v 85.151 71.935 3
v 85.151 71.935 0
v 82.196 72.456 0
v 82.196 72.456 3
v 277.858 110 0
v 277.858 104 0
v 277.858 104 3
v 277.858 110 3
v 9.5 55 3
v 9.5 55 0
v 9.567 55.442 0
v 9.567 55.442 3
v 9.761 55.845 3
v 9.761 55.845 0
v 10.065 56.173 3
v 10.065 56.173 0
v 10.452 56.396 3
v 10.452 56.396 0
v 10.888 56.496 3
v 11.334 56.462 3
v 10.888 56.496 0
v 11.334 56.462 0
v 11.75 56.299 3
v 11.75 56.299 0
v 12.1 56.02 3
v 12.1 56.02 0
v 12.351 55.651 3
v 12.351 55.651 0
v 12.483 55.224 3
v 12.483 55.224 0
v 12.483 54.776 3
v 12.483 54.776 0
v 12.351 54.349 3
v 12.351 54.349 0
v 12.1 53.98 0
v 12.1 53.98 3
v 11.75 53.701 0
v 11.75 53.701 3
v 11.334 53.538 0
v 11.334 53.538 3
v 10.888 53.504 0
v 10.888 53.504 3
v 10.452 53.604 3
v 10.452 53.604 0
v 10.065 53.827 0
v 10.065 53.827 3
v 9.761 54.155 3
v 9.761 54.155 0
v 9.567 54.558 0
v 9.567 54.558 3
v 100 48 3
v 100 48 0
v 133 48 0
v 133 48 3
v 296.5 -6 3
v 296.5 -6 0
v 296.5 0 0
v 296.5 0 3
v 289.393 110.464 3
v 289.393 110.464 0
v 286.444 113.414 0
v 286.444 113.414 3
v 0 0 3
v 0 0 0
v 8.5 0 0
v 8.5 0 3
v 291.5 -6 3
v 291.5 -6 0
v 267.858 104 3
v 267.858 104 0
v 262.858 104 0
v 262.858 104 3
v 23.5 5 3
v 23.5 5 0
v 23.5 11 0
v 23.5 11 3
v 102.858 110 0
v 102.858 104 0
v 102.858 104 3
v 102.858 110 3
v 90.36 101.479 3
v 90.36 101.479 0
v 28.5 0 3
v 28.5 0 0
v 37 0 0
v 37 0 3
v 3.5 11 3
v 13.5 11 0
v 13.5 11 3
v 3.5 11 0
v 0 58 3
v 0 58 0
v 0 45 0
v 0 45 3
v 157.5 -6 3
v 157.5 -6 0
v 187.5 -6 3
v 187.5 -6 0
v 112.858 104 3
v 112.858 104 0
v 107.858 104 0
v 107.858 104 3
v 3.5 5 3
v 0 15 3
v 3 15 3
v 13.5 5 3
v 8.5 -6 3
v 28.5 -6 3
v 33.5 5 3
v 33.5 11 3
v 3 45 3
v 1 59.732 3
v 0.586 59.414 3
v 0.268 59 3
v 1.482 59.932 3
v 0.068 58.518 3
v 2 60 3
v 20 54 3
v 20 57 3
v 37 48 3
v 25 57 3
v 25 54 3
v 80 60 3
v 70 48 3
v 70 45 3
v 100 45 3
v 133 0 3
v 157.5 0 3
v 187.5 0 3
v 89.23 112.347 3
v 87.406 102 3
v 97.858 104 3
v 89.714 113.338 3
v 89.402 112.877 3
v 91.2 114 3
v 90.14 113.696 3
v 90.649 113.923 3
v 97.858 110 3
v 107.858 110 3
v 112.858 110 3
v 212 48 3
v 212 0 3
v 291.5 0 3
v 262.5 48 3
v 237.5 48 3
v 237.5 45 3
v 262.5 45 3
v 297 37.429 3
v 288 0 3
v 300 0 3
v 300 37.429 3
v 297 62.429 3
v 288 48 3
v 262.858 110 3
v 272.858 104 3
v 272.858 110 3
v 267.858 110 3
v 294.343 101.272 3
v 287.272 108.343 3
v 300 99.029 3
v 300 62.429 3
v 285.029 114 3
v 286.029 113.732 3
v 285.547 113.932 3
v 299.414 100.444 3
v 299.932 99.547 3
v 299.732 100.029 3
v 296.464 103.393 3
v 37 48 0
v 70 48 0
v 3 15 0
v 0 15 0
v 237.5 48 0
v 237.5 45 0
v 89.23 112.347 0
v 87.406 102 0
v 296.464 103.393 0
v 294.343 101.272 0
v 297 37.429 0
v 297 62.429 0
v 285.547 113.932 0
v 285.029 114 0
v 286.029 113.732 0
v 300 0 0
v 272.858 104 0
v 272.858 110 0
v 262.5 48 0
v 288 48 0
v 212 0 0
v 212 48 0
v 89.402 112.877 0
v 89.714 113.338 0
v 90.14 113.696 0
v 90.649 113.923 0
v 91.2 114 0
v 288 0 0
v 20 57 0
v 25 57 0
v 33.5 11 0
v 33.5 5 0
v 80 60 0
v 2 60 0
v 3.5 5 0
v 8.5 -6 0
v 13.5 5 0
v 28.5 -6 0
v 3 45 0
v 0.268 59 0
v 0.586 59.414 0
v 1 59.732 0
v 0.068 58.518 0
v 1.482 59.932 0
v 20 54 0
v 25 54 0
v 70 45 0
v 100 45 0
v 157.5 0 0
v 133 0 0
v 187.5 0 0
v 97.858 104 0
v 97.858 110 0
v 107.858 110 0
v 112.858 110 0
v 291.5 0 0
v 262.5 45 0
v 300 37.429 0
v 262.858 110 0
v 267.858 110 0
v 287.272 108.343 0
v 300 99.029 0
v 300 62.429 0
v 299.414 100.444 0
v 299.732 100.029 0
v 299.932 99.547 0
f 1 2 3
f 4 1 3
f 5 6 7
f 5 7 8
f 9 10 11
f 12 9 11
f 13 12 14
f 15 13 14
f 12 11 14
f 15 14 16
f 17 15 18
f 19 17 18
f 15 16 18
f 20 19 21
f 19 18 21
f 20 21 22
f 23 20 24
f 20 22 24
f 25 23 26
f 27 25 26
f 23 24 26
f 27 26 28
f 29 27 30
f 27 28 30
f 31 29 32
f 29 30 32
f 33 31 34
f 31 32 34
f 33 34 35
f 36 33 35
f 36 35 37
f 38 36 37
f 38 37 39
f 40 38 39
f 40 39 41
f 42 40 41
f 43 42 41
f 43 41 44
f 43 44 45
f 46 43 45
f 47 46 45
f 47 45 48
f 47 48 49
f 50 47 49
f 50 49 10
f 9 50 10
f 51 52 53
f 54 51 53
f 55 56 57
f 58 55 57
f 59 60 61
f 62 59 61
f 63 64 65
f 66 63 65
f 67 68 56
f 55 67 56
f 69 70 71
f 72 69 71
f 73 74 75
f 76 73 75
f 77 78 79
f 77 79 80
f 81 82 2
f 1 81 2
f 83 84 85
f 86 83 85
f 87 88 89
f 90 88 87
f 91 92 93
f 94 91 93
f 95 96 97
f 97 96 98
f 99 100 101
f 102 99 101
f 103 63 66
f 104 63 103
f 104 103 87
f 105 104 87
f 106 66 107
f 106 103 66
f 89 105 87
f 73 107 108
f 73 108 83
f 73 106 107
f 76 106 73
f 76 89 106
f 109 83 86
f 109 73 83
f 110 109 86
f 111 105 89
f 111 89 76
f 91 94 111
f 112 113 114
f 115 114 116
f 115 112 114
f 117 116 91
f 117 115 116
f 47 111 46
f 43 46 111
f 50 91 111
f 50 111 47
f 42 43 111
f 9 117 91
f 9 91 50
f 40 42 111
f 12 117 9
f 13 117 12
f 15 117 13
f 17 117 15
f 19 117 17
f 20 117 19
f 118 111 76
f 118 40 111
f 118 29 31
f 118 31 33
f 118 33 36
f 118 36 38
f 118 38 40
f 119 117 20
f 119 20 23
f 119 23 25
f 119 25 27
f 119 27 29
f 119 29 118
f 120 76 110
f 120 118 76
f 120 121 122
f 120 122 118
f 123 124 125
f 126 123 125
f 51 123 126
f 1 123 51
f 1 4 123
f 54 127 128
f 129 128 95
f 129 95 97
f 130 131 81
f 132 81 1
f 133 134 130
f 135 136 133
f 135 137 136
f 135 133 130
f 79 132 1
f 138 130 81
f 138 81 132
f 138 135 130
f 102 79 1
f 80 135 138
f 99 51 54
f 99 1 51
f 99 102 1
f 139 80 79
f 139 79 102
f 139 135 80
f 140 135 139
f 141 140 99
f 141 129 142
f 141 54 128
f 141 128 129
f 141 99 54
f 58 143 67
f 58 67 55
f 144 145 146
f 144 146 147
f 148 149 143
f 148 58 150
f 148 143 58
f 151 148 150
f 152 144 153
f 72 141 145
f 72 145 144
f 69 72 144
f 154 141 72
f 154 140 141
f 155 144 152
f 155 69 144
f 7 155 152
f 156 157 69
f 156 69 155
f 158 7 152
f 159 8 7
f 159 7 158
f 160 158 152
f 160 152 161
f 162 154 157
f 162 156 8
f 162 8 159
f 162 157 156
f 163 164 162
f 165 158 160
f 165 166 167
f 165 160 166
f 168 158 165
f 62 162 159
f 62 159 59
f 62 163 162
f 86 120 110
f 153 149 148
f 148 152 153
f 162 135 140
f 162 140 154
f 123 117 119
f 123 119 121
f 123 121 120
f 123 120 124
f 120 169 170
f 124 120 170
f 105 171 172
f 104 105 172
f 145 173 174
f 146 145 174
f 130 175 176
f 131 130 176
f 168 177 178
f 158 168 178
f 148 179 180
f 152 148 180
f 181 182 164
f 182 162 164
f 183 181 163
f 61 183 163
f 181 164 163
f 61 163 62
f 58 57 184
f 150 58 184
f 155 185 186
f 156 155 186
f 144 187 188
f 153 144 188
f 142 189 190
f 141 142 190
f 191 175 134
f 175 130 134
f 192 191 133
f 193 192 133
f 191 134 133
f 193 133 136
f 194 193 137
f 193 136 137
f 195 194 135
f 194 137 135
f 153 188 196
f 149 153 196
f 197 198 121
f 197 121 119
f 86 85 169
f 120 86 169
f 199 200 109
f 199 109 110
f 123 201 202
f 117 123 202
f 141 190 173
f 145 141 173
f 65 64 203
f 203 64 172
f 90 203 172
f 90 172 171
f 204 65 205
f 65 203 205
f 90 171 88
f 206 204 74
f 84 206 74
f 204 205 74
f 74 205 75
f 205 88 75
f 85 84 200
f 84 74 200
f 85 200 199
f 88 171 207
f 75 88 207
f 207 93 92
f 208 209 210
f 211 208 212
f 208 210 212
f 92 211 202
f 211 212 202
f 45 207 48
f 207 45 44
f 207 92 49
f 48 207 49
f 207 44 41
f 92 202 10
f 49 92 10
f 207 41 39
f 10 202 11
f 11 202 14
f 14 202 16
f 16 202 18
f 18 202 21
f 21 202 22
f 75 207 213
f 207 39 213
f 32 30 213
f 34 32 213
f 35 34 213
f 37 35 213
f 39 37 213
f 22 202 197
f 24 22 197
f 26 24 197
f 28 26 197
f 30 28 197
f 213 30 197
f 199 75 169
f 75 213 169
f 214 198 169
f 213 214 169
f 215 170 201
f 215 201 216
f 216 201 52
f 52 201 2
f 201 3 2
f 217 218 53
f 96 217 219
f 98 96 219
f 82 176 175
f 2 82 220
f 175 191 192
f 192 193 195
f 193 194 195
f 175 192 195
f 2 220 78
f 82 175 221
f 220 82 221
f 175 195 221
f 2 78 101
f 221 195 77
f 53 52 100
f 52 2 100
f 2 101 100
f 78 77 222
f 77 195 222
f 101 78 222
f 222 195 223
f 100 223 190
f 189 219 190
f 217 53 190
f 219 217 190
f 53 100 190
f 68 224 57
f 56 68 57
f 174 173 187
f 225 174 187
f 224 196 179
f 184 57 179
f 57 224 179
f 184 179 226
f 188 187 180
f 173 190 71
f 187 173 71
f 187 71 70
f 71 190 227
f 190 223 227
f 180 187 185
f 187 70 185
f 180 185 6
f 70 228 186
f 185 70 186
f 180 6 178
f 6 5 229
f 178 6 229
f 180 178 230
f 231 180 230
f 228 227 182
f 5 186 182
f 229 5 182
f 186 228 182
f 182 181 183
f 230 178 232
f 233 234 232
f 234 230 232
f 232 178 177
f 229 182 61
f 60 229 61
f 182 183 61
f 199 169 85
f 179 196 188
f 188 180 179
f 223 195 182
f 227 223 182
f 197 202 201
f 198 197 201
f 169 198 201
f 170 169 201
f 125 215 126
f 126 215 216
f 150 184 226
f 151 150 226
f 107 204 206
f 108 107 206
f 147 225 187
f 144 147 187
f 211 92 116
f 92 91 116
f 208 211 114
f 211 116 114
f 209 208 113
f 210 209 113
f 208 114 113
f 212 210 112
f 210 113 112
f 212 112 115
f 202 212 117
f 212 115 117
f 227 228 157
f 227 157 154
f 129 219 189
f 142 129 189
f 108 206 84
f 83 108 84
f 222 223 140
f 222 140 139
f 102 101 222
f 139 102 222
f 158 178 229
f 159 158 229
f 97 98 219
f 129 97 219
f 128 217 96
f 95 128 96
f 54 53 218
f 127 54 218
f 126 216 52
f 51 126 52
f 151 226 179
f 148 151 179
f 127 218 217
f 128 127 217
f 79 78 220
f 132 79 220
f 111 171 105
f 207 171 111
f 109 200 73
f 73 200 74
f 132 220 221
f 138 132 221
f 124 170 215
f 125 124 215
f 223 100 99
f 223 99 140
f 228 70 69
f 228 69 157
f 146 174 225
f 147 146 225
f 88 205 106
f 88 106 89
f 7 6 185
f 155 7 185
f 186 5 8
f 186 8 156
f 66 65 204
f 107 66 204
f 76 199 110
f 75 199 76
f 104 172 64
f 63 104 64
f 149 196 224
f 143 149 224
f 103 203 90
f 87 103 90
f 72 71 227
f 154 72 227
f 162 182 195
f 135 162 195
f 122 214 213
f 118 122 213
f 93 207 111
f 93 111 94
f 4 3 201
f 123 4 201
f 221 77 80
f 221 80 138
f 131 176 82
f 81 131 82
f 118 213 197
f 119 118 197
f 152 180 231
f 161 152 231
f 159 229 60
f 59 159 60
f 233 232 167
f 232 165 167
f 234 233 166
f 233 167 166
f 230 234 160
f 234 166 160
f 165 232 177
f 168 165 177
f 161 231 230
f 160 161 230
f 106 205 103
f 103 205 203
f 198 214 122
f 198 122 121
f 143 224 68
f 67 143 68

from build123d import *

# Parameters (mm, degrees)
BOSS_EXTRUDE1_DEPTH = 3
SKETCH2_W           = 3
SKETCH2_H           = 30
CUT_EXTRUDE1_DEPTH  = 321.943920335
SKETCH3_W           = 10
SKETCH3_H           = 6
CUT_EXTRUDE2_DEPTH  = 321.943920335
SKETCH4_R           = 1.5
SKETCH4_W           = 5
SKETCH4_H           = 3
CUT_EXTRUDE3_DEPTH  = 321.943920335
SKETCH5_W           = 5
SKETCH5_H           = 6
CUT_EXTRUDE4_DEPTH  = 321.943920335
FILLET1_R           = 2


with BuildPart() as part:
    # Sketch1 → Boss-Extrude1 (new body)
    with BuildSketch(Plane.XY):
        Polygon((0, 0), (8.5, 0), (8.5, -6), (28.5, -6), (28.5, 0), (37, 0), (37, 48), (70, 48), (70, 45), (100, 45), (100, 48), (133, 48), (133, 0), (157.5, 0), (157.5, -6), (187.5, -6), (187.5, 0), (212, 0), (212, 48), (237.5, 48), (237.5, 45), (262.5, 45), (262.5, 48), (288, 48), (288, 0), (291.5, 0), (291.5, -6), (296.5, -6), (296.5, 0), (300, 0), (300, 37.428932188), (297, 37.428932188), (297, 62.428932188), (300, 62.428932188), (300, 99.857864376), (296.464466094, 103.393398282), (294.343145751, 101.272077939), (287.272077939, 108.343145751), (289.393398282, 110.464466094), (285.857864376, 114), (89.521656958, 114), (80, 60), (0, 60), align=None)
    extrude(amount=BOSS_EXTRUDE1_DEPTH)

    # Sketch2 → Cut-Extrude1 (cut, through all)
    with BuildSketch(Plane(origin=(0, 0, 0), x_dir=(-1, 0, 0), z_dir=(0, 0, -1))):
        Polygon((-87.40573319, 102), (-90.360156449, 101.479055467), (-85.150711119, 71.934822877), (-82.19628786, 72.45576741), align=None)
        with Locations((-1.5, 30)):
            Rectangle(SKETCH2_W, SKETCH2_H)
    extrude(amount=-CUT_EXTRUDE1_DEPTH, mode=Mode.SUBTRACT)

    # Sketch3 → Cut-Extrude2 (cut, through all)
    with BuildSketch(Plane(origin=(0, 0, 0), x_dir=(-1, 0, 0), z_dir=(0, 0, -1))):
        with Locations((-28.5, 8)):
            Rectangle(SKETCH3_W, SKETCH3_H)
        with Locations((-8.5, 8)):
            Rectangle(SKETCH3_W, SKETCH3_H)
    extrude(amount=-CUT_EXTRUDE2_DEPTH, mode=Mode.SUBTRACT)

    # Sketch4 → Cut-Extrude3 (cut, through all)
    with BuildSketch(Plane(origin=(0, 0, 0), x_dir=(-1, 0, 0), z_dir=(0, 0, -1))):
        with Locations((-11, 55)):
            Circle(SKETCH4_R)
        with Locations((-22.5, 55.5)):
            Rectangle(SKETCH4_W, SKETCH4_H)
    extrude(amount=-CUT_EXTRUDE3_DEPTH, mode=Mode.SUBTRACT)

    # Sketch5 → Cut-Extrude4 (cut, through all)
    with BuildSketch(Plane(origin=(0, 0, 0), x_dir=(-1, 0, 0), z_dir=(0, 0, -1))):
        with Locations((-275.357864376, 107)):
            Rectangle(SKETCH5_W, SKETCH5_H)
        with Locations((-265.357864376, 107)):
            Rectangle(SKETCH5_W, SKETCH5_H)
        with Locations((-110.357864376, 107)):
            Rectangle(SKETCH5_W, SKETCH5_H)
        with Locations((-100.357864376, 107)):
            Rectangle(SKETCH5_W, SKETCH5_H)
    extrude(amount=-CUT_EXTRUDE4_DEPTH, mode=Mode.SUBTRACT)

    # Fillet1
    fillet1_edges = [part.edges().sort_by_distance(p)[0] for p in [
        (0, 60, 1.5),
        (89.521656958, 114, 1.5),
        (285.857864376, 114, 1.5),
        (300, 99.857864376, 1.5),
    ]]
    fillet(fillet1_edges, radius=FILLET1_R)


solid = part.part
